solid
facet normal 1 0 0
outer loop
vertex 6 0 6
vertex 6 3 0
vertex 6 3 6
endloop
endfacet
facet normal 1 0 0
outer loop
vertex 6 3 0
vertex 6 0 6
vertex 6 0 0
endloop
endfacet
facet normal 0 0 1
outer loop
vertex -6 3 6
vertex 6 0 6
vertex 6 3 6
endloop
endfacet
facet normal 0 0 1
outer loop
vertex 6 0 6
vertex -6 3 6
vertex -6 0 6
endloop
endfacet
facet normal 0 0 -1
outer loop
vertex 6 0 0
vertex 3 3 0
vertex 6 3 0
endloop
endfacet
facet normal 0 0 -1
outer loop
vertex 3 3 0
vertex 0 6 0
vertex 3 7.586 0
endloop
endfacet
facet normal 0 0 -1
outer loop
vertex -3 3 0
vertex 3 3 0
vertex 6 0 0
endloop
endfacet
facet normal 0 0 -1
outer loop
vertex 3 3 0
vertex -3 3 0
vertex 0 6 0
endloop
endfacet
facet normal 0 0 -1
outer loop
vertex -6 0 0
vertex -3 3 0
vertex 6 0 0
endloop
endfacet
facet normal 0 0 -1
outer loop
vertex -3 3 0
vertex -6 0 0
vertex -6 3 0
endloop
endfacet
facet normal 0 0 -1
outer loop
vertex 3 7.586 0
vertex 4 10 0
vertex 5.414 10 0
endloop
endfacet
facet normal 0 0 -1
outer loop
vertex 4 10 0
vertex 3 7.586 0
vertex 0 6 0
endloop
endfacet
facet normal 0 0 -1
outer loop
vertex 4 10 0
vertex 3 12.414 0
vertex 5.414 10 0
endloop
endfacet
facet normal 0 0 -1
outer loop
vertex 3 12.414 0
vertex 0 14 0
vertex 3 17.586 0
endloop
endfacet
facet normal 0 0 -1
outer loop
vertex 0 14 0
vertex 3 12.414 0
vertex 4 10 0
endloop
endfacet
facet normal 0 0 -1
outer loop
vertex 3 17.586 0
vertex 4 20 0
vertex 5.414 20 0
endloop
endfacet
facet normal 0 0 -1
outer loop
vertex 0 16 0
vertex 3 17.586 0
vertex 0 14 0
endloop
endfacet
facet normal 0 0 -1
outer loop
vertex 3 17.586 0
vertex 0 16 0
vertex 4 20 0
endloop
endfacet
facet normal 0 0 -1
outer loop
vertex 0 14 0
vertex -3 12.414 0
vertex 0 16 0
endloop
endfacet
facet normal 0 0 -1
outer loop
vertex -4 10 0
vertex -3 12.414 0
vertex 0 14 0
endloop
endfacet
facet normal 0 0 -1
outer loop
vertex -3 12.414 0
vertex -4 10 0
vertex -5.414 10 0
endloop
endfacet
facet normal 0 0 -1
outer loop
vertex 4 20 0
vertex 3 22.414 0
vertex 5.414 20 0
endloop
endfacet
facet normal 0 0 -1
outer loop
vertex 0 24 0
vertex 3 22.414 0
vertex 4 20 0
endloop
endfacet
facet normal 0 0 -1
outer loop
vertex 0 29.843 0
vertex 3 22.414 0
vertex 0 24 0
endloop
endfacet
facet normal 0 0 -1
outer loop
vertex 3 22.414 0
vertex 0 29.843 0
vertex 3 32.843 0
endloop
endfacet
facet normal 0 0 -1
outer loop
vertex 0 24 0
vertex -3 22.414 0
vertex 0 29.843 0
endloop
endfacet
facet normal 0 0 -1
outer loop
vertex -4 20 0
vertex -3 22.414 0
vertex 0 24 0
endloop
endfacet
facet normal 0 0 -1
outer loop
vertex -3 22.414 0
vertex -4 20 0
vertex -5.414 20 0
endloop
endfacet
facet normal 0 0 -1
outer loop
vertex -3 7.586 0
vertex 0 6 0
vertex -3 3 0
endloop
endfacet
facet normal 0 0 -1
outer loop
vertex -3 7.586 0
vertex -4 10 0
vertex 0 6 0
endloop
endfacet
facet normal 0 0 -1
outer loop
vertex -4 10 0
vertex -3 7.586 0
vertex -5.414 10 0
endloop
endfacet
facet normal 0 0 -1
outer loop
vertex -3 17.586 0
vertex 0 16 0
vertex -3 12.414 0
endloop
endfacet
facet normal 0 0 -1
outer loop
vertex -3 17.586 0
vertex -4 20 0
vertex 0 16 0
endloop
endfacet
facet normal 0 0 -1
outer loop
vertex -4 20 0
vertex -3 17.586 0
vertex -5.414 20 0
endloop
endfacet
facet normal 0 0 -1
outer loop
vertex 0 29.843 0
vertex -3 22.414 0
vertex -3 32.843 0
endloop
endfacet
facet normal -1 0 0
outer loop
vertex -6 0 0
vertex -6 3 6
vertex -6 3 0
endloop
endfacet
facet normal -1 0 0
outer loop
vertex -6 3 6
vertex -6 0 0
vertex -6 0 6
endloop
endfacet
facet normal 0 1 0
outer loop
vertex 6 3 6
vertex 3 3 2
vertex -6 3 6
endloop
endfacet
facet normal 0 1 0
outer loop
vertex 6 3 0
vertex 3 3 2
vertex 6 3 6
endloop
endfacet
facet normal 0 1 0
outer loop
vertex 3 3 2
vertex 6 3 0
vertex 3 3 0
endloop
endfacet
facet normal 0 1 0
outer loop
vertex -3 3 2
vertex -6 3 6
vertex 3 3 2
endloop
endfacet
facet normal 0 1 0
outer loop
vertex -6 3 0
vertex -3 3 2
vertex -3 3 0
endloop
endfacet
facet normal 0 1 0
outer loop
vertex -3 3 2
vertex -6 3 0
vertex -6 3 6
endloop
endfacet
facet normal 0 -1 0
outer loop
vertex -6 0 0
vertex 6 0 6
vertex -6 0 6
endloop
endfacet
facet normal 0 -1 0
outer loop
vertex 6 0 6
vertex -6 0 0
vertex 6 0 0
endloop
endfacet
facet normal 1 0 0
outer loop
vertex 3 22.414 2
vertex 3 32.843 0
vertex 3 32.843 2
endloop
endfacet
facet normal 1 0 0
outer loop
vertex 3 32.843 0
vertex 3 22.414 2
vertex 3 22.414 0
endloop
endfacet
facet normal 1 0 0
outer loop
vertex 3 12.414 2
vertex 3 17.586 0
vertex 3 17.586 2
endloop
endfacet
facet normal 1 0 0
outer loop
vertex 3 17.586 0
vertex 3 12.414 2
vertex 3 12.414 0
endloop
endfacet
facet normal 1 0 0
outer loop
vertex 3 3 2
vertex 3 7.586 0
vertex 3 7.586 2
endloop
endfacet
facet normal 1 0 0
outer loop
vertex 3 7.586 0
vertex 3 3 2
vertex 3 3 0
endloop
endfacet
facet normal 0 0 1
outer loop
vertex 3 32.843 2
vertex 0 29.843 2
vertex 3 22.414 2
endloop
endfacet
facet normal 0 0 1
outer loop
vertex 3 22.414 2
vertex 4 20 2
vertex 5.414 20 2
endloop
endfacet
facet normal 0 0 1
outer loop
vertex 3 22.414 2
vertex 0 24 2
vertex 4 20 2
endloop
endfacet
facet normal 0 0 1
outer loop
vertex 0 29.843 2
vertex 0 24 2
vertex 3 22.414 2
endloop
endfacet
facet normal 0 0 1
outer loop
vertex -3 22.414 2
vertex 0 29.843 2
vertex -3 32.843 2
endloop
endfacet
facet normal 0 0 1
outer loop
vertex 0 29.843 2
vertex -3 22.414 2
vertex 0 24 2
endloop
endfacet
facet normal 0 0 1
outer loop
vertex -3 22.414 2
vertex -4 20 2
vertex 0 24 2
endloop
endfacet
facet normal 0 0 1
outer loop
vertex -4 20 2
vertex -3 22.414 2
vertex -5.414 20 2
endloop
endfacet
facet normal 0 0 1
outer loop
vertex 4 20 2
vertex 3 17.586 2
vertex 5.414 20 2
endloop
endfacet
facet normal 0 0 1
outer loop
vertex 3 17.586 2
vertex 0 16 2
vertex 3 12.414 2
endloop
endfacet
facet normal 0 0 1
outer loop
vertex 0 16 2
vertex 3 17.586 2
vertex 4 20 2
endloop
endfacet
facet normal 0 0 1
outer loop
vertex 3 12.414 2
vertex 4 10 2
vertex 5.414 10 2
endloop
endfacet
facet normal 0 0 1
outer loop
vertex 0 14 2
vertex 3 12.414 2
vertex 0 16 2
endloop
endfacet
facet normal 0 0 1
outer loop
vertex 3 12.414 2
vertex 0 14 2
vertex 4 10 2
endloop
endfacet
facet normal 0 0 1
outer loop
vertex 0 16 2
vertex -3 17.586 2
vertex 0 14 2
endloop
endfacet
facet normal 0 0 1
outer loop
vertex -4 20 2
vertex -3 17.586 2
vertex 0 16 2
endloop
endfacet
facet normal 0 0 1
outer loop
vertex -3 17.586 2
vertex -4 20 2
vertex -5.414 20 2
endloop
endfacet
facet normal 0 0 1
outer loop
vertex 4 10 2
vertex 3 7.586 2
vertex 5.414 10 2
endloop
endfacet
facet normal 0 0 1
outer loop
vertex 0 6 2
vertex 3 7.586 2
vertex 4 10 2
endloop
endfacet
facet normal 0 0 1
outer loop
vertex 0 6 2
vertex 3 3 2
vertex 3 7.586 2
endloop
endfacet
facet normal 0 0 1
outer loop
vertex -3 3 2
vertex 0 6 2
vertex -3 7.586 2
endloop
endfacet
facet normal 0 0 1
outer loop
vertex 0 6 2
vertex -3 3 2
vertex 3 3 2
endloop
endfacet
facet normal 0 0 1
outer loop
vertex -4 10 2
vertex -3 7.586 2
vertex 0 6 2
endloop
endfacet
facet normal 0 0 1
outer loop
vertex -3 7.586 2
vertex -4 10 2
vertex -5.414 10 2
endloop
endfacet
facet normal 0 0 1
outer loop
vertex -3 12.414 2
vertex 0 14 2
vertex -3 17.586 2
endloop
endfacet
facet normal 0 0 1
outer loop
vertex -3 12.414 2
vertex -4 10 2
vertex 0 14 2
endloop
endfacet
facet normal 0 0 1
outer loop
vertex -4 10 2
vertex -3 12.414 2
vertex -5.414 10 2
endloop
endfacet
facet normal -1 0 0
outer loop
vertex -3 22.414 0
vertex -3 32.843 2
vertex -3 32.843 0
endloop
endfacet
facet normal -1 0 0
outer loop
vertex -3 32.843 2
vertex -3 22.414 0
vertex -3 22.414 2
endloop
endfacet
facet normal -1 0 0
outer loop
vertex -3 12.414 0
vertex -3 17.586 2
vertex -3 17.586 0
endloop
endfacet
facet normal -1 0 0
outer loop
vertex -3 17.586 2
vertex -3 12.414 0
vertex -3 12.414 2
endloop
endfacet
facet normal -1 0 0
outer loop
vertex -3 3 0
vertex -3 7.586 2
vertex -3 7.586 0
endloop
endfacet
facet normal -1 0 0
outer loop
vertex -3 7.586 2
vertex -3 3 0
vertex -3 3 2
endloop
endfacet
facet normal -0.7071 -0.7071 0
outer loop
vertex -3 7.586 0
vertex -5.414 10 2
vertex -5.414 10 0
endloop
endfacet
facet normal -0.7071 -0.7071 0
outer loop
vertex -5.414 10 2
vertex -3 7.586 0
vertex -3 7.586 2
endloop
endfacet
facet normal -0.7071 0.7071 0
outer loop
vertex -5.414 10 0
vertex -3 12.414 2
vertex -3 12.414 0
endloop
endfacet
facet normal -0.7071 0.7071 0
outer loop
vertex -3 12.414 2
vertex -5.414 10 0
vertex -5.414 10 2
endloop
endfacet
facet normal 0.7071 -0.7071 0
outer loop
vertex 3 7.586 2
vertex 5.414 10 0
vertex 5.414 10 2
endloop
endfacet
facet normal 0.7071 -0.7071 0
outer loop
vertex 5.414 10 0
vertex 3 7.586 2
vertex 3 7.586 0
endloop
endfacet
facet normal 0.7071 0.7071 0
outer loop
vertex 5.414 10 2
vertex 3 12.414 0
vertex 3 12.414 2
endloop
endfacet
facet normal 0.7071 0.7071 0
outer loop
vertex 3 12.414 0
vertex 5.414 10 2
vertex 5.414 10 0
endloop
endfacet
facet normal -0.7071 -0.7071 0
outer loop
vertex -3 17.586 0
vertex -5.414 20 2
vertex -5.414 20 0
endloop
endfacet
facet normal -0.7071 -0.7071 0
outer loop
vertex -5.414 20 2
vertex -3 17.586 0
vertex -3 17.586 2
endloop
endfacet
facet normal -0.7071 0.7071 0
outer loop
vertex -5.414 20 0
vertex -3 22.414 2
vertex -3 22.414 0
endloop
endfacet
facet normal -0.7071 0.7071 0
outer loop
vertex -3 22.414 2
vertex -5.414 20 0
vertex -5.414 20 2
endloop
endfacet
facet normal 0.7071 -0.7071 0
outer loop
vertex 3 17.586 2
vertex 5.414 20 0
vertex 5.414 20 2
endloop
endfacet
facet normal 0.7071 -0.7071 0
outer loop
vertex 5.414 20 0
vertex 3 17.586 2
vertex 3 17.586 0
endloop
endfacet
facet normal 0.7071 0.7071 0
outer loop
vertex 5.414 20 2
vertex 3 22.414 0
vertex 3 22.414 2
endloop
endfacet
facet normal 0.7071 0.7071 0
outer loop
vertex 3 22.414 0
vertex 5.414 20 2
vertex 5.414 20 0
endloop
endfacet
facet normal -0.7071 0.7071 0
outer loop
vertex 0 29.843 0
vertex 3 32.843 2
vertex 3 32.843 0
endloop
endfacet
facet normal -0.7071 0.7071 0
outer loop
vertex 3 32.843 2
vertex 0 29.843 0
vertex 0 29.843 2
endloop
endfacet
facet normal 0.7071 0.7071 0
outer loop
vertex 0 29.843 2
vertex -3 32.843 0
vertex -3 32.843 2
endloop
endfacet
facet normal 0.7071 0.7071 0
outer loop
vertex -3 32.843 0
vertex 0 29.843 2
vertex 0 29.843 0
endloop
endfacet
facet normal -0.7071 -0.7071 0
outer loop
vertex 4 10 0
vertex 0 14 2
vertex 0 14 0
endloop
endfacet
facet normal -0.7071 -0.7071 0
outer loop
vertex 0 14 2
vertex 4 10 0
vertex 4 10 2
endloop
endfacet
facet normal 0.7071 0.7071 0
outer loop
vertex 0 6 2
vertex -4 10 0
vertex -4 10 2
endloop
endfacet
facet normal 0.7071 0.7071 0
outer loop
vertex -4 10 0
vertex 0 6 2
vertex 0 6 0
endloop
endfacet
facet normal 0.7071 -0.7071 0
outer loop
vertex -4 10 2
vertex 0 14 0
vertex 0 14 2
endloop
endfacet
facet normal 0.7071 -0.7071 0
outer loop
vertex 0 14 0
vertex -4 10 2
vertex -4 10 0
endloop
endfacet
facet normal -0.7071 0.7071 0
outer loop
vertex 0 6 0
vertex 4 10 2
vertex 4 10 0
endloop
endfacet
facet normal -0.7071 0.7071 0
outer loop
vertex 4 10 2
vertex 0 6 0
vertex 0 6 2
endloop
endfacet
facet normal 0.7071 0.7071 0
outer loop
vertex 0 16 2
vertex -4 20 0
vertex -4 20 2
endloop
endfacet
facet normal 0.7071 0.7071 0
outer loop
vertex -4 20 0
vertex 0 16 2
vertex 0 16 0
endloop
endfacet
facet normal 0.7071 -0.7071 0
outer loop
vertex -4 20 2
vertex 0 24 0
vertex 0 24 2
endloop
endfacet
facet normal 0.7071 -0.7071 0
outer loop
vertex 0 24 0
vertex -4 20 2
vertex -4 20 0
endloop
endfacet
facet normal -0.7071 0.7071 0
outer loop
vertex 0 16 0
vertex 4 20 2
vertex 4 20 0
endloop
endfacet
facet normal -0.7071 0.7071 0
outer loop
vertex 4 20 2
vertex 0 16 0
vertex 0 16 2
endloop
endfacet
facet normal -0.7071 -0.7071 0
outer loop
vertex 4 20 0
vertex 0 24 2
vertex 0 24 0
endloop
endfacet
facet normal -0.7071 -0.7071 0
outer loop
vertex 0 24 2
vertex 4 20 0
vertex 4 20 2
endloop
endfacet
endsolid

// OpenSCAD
//Parametric Rod Brace, by ggroloff 9.19.2018
//Use this to make a rod brace of any length and springiness to prevent unwanted rod motion.

//All units in mm

//the distance between the rod and whatever surface to brace against,(round up by ~0.5)
rod_distance=31.5;

//The diameter of the rod
rod_diameter = 8;

//Width of the support
support_width = 6;

//Thickness of the support
support_thickness = 2;

//Thickness of the base
base_plate_thickness = 3;

//Width of the base
base_plate_width = 12;

//Length of the base
base_plate_length = 6;

//Offset of the base from the support
base_plate_offset = 0;

//Length of the spring, related to spring travel distance (set to 0 for no spring)
spring_length = 8;

//Thickness of the spring walls, related to spring constant K
spring_thickness = 1.0;

//Position of the spring 1 on the support
spring1_height = 10;

//Position of spring 2 on the support (set to the same as spring 1 for 1 spring)
spring2_height = 20;


/*[Hidden]*/
//code starts here

module body() {
    translate ([-base_plate_width/2+base_plate_offset,0,0]) cube ([base_plate_width,base_plate_thickness,base_plate_length]);
    translate ([-support_width/2,0,0]) cube ([support_width,rod_distance+rod_diameter/2,support_thickness]);
    translate ([0,spring1_height, support_thickness/2]) rotate ([0,0,45]) cube ([spring_length/1.41421356237+spring_thickness*2,spring_length/1.41421356237+spring_thickness*2,support_thickness], center=true);
    translate ([0,spring2_height, support_thickness/2]) rotate ([0,0,45]) cube ([spring_length/1.41421356237+spring_thickness*2,spring_length/1.41421356237+spring_thickness*2,support_thickness], center=true);
}
//body();

module spring() {
        translate ([0,0,spring_height]) rotate ([0,0,45]) cube ([spring_length/1.41421356237,spring_length/1.41421356237,support_thickness], center=true);
}
//spring();


module rod() {
        cylinder (d=1.41421356237*rod_diameter,h=50,center=true,$fn=4);//render square rod of rod_diameter width
}


difference() {
 body();
translate ([0,rod_distance+rod_diameter/2,0]) rotate ([0,0,0]) rod();//drill out rod
translate ([0,spring1_height,support_thickness/2-.01]) rotate ([0,0,45]) cube ([spring_length/1.41421356237,spring_length/1.41421356237,support_thickness+1], center=true);
translate ([0,spring2_height,support_thickness/2-.01]) rotate ([0,0,45]) cube ([spring_length/1.41421356237,spring_length/1.41421356237,support_thickness+1], center=true);
}
